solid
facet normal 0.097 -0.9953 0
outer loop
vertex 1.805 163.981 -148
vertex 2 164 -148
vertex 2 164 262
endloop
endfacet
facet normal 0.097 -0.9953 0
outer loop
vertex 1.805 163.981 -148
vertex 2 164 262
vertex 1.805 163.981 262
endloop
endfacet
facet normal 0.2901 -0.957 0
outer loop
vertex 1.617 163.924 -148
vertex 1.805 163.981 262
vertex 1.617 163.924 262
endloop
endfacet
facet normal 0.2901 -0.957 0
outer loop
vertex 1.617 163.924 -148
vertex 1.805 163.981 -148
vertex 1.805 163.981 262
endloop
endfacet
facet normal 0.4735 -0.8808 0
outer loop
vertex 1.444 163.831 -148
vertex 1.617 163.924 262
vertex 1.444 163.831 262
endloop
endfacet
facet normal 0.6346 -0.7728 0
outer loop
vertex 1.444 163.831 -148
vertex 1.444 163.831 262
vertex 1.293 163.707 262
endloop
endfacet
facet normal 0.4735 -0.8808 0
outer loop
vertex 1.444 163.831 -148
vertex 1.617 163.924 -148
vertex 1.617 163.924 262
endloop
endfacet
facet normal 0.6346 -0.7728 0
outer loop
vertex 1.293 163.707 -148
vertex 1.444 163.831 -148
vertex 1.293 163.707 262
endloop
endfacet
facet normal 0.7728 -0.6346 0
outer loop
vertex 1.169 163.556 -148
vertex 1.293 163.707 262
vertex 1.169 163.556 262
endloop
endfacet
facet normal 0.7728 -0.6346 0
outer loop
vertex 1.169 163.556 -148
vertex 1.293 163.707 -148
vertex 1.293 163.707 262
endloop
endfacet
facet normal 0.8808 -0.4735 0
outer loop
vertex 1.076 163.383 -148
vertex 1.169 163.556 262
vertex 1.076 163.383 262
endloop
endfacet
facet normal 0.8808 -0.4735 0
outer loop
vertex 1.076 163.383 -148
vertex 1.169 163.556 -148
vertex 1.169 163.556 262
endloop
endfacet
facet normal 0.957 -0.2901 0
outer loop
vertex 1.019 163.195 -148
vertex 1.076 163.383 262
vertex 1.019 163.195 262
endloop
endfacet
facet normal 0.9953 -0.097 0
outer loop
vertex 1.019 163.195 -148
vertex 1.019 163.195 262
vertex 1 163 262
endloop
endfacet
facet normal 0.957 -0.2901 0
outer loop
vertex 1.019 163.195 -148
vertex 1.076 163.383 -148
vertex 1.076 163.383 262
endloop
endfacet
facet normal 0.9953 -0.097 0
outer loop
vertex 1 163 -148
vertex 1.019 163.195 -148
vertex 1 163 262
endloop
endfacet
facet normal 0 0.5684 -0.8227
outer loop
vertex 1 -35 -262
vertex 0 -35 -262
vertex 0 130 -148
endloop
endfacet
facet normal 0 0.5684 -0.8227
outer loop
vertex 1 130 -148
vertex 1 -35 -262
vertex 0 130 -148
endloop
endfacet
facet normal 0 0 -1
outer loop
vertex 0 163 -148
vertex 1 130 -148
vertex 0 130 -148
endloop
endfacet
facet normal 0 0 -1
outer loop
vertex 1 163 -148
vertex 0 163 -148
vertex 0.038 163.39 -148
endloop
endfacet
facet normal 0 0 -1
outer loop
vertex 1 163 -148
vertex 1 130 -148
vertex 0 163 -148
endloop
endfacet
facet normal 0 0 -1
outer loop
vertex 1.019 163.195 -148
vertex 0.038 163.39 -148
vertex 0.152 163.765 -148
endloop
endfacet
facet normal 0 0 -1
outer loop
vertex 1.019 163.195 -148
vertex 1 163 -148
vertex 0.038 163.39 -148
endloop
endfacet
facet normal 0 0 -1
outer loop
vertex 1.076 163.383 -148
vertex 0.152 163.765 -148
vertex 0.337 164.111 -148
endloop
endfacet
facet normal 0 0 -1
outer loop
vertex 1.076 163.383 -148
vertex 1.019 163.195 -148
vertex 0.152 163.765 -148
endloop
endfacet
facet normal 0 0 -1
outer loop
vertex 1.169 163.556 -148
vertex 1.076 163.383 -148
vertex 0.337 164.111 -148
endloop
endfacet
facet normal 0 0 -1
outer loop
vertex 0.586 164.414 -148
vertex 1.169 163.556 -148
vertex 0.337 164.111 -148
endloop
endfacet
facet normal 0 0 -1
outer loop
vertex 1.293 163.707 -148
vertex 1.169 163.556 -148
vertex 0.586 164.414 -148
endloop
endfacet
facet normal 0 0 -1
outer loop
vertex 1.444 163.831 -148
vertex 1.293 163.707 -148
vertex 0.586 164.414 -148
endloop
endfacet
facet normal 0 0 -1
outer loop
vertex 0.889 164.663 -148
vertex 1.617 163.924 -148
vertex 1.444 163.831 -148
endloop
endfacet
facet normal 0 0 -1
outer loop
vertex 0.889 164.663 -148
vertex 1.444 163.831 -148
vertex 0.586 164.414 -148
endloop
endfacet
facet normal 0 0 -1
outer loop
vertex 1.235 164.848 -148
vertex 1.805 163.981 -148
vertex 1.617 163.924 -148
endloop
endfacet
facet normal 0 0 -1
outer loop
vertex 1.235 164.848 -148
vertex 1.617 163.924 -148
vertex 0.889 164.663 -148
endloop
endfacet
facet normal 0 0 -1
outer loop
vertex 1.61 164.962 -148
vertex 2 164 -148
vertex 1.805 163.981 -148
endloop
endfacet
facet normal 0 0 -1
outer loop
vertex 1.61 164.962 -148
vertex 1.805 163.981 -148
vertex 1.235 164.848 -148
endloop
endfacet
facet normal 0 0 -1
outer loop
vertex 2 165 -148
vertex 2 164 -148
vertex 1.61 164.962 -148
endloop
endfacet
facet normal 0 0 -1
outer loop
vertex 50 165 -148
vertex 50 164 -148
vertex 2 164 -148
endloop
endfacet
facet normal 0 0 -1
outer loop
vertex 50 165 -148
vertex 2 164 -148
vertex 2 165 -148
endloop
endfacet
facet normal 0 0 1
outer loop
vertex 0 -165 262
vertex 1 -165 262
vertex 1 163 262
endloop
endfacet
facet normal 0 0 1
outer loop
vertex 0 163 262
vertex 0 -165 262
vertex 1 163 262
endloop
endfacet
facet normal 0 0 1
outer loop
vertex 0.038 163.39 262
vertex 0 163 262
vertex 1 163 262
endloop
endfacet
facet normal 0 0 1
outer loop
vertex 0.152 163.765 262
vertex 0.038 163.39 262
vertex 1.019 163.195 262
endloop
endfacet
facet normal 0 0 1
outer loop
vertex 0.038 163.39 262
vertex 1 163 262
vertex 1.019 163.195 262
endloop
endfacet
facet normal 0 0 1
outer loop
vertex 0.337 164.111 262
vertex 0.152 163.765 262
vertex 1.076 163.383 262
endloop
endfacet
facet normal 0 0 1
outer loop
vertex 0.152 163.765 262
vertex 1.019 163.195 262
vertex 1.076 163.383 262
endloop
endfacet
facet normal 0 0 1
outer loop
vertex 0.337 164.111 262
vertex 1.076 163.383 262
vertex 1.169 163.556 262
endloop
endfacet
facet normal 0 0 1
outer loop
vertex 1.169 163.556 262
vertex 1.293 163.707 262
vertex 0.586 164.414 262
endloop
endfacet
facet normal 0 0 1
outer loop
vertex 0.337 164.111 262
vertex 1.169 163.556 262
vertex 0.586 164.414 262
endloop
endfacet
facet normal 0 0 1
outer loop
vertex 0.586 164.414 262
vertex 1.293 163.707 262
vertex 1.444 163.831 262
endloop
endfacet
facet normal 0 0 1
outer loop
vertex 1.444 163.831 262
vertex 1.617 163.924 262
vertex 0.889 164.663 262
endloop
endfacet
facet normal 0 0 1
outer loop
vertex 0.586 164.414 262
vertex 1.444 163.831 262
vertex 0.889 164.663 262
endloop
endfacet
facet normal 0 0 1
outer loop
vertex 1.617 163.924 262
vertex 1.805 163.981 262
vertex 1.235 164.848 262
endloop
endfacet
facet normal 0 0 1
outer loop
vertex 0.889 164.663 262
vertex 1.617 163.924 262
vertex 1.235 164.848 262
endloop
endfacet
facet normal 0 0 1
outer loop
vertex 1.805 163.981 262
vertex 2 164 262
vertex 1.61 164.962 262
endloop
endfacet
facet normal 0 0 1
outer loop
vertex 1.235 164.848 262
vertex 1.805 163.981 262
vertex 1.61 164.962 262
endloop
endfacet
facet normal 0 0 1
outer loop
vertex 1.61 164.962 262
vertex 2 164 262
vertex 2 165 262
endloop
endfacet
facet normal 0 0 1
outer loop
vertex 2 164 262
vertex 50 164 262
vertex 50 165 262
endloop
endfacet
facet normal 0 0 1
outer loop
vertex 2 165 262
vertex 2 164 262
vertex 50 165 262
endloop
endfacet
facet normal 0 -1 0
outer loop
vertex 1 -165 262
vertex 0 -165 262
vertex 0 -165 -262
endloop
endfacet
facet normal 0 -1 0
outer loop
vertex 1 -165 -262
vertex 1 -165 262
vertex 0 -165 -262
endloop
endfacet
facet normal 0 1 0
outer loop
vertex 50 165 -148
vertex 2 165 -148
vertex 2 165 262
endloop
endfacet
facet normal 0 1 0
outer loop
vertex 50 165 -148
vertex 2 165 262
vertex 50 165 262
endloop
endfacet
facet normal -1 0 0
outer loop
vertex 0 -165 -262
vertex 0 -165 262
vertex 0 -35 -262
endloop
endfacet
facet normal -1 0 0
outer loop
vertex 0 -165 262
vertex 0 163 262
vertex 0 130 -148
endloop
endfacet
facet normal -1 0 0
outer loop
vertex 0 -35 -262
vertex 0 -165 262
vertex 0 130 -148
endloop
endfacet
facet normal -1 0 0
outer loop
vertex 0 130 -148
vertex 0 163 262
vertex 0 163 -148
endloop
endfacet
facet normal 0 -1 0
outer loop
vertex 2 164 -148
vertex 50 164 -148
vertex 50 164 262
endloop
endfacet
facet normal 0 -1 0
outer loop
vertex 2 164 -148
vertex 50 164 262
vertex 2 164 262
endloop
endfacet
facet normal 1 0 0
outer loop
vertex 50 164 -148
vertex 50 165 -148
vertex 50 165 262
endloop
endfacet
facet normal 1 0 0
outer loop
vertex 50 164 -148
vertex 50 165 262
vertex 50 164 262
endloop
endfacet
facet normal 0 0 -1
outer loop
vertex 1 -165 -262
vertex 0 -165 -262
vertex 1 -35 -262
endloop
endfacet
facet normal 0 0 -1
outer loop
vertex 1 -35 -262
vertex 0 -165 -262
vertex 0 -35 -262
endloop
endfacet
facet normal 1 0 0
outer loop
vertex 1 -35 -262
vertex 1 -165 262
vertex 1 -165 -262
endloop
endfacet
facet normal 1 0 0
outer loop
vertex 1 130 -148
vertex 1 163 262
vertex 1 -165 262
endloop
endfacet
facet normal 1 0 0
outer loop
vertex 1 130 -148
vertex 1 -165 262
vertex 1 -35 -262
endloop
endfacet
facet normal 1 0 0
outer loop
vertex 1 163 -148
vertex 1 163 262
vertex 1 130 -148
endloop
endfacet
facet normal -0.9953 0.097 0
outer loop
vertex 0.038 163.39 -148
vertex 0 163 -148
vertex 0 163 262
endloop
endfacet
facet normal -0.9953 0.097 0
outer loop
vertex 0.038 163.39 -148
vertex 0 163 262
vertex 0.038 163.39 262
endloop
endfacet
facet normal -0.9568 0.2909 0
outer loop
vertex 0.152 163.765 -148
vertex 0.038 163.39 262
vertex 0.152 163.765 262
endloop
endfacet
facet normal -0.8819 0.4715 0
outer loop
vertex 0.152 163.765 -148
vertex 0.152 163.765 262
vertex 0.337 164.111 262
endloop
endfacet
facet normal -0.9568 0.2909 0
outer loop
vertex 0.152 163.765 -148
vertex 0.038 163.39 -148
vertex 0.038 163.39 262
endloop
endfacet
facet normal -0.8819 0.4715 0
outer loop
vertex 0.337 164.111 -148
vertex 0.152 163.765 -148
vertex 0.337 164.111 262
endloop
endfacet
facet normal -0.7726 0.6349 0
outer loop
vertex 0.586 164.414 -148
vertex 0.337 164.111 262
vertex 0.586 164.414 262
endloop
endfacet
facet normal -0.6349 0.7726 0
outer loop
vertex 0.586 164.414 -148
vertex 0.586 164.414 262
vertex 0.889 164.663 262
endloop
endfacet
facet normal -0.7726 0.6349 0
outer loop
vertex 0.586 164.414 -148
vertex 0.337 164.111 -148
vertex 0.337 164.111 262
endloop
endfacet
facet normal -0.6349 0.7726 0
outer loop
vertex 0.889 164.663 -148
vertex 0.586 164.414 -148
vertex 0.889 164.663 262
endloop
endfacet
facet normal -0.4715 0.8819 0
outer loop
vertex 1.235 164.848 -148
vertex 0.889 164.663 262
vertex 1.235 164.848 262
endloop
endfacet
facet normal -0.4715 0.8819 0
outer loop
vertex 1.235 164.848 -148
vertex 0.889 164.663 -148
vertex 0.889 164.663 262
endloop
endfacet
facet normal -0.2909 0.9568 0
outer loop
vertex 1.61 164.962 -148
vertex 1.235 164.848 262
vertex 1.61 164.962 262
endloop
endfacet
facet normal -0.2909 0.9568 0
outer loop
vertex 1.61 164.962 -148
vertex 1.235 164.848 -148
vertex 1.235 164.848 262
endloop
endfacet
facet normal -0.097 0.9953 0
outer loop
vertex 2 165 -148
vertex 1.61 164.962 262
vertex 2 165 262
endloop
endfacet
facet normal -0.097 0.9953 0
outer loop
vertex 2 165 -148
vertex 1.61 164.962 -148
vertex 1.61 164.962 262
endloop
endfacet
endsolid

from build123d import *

# Parameters (mm, degrees)
EXTRUDE_1_DEPTH                  = 1
SM_EDGE_FLANGE_1_STRIP_W         = 6
SM_EDGE_FLANGE_1_STRIP_H         = 1
SM_EDGE_FLANGE_1_STRIP_CUT_DEPTH = 410
SM_EDGE_FLANGE_1_DEPTH           = 410


# Sheet-metal steps are written as plain solids
with BuildPart() as part:
    # Sketch 1 → Бобышка-Вытянуть1 (new body)
    with BuildSketch(Plane(origin=(0, 0, 0), x_dir=(0, 0, -1), z_dir=(1, 0, 0))):
        Polygon((-262, -165), (262, -165), (262, -35), (148, 130), (148, 165), (-262, 165), align=None)
    extrude(amount=EXTRUDE_1_DEPTH)

    # Ребро-кромка1 strip (across the edge) → Ребро-кромка1 strip cut (cut)
    with BuildSketch(Plane(origin=(1, 165, -148), x_dir=(0, -1, 0), z_dir=(0, 0, 1))):
        with Locations((-1, -0.5)):
            Rectangle(SM_EDGE_FLANGE_1_STRIP_W, SM_EDGE_FLANGE_1_STRIP_H)
    extrude(amount=SM_EDGE_FLANGE_1_STRIP_CUT_DEPTH, mode=Mode.SUBTRACT)

    # Ребро-кромка1 section (across the edge) → Ребро-кромка1 (add)
    with BuildSketch(Plane(origin=(1, 165, -148), x_dir=(0, -1, 0), z_dir=(0, 0, 1))):
        with BuildLine():
            Line((0, 1), (0, 49))
            Line((0, 49), (1, 49))
            Line((1, 49), (1, 1))
            ThreePointArc((1, 1), (1.292893219, 0.292893219), (2, 0))
            Line((2, 0), (2, -1))
            ThreePointArc((2, -1), (0.585786438, -0.414213562), (0, 1))
        make_face()
    extrude(amount=SM_EDGE_FLANGE_1_DEPTH)


solid = part.part
